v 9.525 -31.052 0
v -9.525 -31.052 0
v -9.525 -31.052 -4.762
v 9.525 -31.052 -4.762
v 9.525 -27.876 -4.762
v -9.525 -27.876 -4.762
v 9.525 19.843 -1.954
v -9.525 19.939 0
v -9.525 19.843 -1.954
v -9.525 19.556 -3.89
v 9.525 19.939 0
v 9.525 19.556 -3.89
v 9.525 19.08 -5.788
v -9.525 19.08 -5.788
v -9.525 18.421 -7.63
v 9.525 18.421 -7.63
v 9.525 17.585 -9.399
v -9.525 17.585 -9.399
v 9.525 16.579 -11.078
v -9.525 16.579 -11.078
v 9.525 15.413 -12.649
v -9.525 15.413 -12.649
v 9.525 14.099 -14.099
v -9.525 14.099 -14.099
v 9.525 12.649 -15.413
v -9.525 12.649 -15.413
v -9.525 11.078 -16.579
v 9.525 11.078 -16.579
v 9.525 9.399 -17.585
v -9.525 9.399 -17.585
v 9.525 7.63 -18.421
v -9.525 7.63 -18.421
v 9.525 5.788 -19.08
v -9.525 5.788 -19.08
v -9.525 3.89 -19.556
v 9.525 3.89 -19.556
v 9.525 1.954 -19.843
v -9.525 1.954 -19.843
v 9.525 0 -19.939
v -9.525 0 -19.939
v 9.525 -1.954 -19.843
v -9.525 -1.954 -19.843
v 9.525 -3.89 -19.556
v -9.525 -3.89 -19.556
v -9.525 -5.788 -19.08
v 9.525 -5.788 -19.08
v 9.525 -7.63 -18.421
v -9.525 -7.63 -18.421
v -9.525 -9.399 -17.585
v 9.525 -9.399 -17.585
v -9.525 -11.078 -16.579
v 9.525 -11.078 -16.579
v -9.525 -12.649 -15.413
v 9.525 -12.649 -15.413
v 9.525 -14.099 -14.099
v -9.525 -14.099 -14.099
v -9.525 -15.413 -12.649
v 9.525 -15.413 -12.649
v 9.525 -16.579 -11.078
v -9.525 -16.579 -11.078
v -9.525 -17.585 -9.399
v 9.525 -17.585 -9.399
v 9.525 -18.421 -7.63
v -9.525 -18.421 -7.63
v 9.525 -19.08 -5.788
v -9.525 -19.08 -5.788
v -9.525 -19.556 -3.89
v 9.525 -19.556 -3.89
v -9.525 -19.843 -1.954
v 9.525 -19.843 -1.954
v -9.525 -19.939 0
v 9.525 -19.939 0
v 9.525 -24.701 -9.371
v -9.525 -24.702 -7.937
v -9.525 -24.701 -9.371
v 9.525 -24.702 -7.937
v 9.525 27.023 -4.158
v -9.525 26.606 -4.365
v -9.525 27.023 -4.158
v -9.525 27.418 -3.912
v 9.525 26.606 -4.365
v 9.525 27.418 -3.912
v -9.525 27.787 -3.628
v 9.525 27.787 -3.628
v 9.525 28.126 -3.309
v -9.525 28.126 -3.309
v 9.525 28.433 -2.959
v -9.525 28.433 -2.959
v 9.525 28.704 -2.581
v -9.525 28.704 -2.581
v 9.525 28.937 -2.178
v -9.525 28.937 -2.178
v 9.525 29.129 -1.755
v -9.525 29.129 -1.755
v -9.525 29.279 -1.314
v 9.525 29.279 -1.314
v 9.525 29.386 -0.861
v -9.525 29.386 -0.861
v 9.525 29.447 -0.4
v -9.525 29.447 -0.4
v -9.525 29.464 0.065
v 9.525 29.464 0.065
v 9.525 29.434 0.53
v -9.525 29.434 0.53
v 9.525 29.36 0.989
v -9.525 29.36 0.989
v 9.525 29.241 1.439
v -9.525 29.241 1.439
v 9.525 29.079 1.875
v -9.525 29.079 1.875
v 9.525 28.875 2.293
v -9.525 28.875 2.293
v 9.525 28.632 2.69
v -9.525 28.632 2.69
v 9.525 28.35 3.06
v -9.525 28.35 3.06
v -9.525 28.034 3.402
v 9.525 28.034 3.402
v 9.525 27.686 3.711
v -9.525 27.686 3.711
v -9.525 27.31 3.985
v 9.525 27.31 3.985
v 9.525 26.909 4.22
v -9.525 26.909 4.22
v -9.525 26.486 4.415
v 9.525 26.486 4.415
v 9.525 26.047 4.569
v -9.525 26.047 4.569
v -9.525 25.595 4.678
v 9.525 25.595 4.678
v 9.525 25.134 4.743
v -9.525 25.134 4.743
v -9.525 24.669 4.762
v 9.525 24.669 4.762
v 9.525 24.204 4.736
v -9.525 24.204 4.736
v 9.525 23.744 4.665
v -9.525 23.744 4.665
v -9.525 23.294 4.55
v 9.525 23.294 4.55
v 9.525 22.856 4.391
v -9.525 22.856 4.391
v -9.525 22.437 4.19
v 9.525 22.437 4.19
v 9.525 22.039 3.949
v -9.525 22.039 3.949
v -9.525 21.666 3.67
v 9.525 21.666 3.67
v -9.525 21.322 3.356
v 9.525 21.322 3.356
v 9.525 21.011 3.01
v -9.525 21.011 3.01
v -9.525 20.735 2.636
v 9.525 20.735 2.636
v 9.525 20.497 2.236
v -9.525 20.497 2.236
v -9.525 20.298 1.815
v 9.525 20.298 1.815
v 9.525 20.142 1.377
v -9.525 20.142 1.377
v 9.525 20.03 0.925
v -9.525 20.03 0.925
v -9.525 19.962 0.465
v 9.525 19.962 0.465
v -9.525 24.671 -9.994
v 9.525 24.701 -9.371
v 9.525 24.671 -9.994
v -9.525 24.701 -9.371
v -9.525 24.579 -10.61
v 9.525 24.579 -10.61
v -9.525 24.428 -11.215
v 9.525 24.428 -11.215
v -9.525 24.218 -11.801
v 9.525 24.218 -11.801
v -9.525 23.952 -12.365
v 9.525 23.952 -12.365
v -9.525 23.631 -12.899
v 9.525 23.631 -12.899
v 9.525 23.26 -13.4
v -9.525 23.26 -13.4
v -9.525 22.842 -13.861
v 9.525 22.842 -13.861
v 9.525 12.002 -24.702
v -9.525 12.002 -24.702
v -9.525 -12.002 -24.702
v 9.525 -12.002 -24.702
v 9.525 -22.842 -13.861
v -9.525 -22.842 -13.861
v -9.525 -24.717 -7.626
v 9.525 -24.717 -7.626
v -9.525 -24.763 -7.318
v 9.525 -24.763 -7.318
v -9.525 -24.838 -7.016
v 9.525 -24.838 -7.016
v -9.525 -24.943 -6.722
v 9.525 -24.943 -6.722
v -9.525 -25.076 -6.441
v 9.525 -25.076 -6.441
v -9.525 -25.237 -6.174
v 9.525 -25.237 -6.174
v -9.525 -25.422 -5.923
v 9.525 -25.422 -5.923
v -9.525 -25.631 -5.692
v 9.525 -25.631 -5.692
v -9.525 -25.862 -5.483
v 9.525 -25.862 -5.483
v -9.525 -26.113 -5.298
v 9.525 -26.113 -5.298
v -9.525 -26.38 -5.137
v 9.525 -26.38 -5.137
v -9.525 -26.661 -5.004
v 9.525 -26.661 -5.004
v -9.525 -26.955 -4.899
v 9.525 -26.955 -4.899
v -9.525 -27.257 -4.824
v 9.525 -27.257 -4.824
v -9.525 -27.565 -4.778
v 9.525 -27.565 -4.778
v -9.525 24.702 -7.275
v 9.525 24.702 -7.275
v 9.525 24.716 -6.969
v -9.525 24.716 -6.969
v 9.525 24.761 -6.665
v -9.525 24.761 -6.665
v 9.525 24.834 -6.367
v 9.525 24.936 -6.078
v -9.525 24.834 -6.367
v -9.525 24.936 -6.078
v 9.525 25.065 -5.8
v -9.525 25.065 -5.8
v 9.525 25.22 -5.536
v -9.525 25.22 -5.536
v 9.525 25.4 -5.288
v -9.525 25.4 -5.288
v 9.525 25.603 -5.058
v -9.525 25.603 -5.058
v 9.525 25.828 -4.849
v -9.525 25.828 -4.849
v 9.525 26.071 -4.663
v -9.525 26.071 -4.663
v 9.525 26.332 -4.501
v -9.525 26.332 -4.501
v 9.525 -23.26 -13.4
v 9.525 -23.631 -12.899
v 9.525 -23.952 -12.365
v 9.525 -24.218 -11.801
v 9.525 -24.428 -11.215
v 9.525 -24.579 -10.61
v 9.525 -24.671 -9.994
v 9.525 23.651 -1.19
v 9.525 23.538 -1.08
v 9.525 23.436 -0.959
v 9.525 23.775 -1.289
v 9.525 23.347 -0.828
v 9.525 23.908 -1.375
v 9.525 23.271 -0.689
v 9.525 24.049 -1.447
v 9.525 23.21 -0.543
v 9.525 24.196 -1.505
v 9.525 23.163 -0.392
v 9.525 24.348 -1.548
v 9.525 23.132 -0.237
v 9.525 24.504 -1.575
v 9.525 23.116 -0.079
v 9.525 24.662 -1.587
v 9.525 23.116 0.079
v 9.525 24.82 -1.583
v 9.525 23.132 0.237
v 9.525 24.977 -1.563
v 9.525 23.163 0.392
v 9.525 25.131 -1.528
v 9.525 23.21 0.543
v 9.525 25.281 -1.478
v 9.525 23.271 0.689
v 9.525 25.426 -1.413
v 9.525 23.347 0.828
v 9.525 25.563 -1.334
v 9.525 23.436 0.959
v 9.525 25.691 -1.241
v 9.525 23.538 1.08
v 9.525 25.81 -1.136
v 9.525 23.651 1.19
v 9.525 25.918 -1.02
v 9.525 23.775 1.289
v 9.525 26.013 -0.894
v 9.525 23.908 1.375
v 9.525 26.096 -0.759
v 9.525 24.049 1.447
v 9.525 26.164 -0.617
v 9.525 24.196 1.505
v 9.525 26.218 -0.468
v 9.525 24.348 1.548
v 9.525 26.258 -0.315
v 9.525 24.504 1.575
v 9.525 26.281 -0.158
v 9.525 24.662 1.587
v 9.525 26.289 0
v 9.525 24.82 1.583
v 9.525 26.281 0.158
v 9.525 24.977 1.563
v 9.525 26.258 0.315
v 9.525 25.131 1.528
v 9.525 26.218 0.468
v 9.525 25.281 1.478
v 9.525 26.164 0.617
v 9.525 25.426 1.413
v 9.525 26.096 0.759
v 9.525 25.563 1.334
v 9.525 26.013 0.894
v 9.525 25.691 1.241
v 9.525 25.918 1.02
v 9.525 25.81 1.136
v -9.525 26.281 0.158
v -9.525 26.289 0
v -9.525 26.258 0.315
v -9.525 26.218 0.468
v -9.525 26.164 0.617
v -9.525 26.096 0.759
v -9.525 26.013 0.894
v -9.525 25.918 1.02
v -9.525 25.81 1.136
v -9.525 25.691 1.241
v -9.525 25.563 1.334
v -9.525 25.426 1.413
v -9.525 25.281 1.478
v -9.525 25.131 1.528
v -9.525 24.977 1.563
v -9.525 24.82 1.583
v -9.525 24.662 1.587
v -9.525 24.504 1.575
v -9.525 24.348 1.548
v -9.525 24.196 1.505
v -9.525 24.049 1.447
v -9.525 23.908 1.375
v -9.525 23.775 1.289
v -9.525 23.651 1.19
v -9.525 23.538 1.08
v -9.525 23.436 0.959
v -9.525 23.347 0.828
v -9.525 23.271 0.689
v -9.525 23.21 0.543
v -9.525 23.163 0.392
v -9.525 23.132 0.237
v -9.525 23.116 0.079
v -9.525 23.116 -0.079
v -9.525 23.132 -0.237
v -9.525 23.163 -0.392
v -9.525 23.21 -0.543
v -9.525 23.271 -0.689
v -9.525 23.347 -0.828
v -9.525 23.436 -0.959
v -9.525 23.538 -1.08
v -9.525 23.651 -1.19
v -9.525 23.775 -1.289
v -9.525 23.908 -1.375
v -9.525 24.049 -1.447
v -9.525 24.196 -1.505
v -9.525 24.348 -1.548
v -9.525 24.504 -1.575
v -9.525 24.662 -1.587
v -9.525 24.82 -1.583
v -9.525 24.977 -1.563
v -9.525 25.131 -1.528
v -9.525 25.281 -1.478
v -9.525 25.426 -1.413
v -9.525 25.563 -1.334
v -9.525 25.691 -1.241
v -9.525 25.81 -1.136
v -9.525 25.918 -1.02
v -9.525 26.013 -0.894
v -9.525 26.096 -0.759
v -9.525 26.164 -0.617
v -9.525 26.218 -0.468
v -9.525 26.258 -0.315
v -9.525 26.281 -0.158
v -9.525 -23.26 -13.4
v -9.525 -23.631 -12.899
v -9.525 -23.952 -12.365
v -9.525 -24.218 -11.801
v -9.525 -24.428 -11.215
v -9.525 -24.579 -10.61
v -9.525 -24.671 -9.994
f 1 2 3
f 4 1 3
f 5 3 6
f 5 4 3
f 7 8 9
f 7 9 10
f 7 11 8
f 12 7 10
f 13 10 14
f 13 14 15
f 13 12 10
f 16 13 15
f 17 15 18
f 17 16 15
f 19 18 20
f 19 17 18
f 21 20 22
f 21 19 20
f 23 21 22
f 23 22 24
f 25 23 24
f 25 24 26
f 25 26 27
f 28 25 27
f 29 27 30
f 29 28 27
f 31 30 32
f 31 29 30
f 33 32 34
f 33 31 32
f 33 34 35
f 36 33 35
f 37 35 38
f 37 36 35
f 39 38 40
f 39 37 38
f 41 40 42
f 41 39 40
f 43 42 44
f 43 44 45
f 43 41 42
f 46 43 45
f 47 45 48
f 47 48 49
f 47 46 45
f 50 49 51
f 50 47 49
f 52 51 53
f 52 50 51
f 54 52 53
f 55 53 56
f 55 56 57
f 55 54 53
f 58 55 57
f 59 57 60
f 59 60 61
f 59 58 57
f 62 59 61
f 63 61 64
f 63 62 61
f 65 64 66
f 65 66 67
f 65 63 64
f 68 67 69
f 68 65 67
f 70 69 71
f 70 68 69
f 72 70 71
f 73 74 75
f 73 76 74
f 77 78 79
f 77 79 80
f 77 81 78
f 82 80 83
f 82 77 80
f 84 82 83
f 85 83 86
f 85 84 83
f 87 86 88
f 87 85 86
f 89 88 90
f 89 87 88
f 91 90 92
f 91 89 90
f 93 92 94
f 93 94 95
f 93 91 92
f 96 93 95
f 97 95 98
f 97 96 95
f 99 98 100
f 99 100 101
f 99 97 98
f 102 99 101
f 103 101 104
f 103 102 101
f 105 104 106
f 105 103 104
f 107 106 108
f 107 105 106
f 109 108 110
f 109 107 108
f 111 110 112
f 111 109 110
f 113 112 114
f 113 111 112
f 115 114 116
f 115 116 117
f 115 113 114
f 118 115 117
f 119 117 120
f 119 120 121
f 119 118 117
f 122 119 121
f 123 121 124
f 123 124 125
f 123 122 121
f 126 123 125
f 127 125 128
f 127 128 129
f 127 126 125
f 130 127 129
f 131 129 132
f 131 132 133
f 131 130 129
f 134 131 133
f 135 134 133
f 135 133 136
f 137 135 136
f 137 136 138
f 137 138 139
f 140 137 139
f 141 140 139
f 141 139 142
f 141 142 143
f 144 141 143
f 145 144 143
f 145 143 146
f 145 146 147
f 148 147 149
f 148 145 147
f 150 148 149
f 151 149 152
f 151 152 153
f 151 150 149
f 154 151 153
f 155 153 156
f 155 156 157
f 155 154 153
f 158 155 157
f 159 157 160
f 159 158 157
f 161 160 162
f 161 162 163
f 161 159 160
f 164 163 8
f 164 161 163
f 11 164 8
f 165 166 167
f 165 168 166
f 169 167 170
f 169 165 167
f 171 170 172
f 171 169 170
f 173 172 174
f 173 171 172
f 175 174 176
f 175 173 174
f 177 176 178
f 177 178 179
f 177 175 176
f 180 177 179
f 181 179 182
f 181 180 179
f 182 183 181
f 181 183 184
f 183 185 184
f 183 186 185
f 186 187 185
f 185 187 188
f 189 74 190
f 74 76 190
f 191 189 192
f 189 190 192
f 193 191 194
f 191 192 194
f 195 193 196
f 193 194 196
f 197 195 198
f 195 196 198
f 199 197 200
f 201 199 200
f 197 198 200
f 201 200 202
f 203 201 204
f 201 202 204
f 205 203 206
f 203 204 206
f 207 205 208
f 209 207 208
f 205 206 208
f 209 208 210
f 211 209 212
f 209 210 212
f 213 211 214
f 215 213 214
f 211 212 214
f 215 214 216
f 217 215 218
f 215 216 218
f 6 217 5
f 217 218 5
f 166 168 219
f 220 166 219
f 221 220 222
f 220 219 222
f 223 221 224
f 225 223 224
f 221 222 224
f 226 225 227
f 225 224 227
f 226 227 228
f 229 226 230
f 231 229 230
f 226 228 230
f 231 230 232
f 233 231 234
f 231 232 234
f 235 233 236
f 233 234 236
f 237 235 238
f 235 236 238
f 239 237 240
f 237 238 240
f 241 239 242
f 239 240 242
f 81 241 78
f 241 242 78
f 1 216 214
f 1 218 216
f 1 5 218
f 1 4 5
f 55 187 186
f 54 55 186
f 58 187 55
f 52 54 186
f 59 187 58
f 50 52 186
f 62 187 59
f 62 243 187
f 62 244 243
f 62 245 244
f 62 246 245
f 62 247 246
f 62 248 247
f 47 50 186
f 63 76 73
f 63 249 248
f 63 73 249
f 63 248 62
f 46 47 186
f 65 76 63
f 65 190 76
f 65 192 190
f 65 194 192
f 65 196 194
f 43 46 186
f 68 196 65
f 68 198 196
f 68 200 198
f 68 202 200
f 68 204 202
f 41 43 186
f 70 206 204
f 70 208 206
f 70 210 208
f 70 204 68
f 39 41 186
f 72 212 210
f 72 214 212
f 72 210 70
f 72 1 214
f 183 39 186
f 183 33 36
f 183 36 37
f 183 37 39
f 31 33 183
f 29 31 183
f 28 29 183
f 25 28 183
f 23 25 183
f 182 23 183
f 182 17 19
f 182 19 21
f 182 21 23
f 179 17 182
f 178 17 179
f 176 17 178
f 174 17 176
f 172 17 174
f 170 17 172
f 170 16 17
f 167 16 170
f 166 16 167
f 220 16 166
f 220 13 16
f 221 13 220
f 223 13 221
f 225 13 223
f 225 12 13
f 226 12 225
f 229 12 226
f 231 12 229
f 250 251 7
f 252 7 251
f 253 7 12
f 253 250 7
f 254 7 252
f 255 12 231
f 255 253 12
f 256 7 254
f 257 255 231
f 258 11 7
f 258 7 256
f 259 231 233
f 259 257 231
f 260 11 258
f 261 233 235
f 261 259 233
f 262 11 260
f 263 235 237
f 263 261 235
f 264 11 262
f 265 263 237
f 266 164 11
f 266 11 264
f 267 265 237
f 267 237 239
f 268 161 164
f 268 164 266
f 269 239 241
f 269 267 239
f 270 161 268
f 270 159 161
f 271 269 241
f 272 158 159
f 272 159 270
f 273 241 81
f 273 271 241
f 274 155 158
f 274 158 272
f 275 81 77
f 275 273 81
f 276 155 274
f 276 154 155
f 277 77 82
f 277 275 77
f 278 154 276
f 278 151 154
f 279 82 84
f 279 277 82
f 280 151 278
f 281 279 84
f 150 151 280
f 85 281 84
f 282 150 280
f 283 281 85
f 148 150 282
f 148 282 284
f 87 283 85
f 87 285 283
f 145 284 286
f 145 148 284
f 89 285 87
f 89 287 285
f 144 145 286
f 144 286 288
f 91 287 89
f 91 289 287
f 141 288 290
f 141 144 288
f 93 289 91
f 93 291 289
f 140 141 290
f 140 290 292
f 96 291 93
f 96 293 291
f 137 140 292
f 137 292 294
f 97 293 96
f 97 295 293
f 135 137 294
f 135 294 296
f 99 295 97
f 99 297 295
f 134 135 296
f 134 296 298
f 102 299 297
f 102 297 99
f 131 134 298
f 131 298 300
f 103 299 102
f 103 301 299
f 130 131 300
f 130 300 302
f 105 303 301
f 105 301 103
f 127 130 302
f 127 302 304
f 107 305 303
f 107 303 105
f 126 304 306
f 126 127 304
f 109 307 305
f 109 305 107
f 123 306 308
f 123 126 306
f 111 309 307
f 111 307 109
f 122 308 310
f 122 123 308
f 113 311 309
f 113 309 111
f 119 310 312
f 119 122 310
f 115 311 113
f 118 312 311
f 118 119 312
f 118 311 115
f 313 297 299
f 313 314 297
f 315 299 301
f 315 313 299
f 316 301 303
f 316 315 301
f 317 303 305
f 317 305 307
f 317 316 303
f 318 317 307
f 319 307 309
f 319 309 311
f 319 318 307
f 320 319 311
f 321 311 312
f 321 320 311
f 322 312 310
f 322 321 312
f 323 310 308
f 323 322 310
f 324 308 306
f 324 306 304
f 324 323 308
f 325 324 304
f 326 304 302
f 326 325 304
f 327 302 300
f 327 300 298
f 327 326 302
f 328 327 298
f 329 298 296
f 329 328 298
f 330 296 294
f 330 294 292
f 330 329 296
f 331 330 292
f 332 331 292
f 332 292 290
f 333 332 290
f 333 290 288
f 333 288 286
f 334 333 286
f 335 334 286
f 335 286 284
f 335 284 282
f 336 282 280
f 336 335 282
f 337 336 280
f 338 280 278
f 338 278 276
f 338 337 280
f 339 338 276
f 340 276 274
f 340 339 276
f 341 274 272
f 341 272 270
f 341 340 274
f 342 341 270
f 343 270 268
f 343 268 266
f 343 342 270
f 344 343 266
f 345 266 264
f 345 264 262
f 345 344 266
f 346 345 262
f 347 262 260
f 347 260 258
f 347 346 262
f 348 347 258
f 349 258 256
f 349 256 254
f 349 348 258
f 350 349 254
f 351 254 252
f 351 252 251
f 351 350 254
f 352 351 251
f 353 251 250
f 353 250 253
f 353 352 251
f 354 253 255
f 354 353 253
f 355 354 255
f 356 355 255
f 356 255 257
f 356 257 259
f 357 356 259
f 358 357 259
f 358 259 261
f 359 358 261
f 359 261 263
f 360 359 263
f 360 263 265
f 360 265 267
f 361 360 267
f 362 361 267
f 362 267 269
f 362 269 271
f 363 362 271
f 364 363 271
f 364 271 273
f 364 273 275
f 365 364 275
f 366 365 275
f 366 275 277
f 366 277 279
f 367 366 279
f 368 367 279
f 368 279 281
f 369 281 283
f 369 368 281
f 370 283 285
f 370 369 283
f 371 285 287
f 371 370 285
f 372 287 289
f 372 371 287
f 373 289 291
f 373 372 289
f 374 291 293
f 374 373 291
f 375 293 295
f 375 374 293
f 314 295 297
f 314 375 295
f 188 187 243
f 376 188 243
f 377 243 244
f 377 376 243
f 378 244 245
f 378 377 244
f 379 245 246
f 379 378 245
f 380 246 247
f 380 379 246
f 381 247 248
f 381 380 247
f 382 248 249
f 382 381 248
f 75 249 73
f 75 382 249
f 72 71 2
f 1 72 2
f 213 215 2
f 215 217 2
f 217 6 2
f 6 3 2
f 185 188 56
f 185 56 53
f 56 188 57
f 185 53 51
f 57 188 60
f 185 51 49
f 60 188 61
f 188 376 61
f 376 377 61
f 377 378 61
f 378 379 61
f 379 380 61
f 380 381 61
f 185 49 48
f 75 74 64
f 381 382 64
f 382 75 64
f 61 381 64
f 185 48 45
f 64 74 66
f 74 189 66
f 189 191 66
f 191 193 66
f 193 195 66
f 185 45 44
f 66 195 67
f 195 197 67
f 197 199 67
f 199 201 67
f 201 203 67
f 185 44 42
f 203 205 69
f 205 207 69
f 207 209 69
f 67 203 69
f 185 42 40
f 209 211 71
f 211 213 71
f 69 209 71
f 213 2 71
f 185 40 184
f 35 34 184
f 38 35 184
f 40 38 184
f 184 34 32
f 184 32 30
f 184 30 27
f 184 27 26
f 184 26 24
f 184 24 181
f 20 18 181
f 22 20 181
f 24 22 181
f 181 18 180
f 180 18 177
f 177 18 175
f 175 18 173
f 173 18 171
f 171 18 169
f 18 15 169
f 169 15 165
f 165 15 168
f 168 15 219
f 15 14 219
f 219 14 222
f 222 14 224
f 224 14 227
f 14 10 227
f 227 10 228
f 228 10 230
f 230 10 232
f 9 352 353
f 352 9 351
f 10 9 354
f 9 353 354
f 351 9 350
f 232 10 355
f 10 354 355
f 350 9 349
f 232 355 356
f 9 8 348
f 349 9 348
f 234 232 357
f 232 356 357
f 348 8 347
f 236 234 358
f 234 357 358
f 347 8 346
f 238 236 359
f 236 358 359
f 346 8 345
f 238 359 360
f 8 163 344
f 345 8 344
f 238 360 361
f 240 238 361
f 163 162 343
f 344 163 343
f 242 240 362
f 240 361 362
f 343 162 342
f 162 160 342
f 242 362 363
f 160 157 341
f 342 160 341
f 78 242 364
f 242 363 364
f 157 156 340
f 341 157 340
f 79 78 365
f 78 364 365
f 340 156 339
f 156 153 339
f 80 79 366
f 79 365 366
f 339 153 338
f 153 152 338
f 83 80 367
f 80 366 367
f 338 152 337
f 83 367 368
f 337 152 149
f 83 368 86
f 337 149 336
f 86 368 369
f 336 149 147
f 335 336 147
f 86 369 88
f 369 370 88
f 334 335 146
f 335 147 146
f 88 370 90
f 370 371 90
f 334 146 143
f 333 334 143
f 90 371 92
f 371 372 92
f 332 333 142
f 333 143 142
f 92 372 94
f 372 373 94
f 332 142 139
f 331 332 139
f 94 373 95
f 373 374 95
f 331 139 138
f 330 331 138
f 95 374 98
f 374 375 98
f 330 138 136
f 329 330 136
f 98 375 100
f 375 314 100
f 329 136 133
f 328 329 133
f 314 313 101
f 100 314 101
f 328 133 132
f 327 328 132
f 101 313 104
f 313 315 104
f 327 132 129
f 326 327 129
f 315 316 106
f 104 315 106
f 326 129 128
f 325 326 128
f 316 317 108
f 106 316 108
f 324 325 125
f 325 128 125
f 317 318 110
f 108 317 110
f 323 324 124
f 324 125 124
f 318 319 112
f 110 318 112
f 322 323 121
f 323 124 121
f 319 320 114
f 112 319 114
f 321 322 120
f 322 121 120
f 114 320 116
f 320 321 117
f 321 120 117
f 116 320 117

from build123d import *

# Parameters (mm, degrees)
F0_R     = 1.5875
F1_DEPTH = 9.525
F2_SIZE  = 12.7
F3_R     = 3.175
F4_R     = 6.35


with BuildPart() as f1:
    # F0 (on Right) → F1 (new body, symmetric)
    with BuildSketch(Plane.YZ):
        with BuildLine():
            ThreePointArc((19.939, 0), (0, -19.939), (-19.939, 0))
            Line((-19.939, 0), (-24.7015, 0))
            Line((-24.7015, 0), (-31.0515, 0))
            Line((-31.0515, 0), (-31.0515, -4.7625))
            Line((-31.0515, -4.7625), (-24.7015, -4.7625))
            Line((-24.7015, -4.7625), (-24.7015, -24.7015))
            Line((-24.7015, -24.7015), (24.7015, -24.7015))
            Line((24.7015, -24.7015), (24.7015, -4.7625))
            ThreePointArc((24.7015, -4.7625), (28.0690960454, 3.3675960454), (19.939, 0))
        make_face()
        with Locations((24.7015, 0)):
            Circle(F0_R, mode=Mode.SUBTRACT)
    extrude(amount=F1_DEPTH, both=True)

    # F2
    f2_edges = [f1.edges().sort_by_distance(p)[0] for p in [
        (0, -24.7015, -24.7015),
        (0, 24.7015, -24.7015),
    ]]
    chamfer(f2_edges, length=F2_SIZE)

    # F3
    f3_edges = [f1.edges().sort_by_distance(p)[0] for p in [
        (0, 24.7015, -4.7625),
        (0, -24.7015, -4.7625),
    ]]
    fillet(f3_edges, radius=F3_R)

    # F4
    f4_edges = [f1.edges().sort_by_distance(p)[0] for p in [
        (0, 24.7015, -12.0015),
        (0, -24.7015, -12.0015),
    ]]
    fillet(f4_edges, radius=F4_R)


solid = f1.part
